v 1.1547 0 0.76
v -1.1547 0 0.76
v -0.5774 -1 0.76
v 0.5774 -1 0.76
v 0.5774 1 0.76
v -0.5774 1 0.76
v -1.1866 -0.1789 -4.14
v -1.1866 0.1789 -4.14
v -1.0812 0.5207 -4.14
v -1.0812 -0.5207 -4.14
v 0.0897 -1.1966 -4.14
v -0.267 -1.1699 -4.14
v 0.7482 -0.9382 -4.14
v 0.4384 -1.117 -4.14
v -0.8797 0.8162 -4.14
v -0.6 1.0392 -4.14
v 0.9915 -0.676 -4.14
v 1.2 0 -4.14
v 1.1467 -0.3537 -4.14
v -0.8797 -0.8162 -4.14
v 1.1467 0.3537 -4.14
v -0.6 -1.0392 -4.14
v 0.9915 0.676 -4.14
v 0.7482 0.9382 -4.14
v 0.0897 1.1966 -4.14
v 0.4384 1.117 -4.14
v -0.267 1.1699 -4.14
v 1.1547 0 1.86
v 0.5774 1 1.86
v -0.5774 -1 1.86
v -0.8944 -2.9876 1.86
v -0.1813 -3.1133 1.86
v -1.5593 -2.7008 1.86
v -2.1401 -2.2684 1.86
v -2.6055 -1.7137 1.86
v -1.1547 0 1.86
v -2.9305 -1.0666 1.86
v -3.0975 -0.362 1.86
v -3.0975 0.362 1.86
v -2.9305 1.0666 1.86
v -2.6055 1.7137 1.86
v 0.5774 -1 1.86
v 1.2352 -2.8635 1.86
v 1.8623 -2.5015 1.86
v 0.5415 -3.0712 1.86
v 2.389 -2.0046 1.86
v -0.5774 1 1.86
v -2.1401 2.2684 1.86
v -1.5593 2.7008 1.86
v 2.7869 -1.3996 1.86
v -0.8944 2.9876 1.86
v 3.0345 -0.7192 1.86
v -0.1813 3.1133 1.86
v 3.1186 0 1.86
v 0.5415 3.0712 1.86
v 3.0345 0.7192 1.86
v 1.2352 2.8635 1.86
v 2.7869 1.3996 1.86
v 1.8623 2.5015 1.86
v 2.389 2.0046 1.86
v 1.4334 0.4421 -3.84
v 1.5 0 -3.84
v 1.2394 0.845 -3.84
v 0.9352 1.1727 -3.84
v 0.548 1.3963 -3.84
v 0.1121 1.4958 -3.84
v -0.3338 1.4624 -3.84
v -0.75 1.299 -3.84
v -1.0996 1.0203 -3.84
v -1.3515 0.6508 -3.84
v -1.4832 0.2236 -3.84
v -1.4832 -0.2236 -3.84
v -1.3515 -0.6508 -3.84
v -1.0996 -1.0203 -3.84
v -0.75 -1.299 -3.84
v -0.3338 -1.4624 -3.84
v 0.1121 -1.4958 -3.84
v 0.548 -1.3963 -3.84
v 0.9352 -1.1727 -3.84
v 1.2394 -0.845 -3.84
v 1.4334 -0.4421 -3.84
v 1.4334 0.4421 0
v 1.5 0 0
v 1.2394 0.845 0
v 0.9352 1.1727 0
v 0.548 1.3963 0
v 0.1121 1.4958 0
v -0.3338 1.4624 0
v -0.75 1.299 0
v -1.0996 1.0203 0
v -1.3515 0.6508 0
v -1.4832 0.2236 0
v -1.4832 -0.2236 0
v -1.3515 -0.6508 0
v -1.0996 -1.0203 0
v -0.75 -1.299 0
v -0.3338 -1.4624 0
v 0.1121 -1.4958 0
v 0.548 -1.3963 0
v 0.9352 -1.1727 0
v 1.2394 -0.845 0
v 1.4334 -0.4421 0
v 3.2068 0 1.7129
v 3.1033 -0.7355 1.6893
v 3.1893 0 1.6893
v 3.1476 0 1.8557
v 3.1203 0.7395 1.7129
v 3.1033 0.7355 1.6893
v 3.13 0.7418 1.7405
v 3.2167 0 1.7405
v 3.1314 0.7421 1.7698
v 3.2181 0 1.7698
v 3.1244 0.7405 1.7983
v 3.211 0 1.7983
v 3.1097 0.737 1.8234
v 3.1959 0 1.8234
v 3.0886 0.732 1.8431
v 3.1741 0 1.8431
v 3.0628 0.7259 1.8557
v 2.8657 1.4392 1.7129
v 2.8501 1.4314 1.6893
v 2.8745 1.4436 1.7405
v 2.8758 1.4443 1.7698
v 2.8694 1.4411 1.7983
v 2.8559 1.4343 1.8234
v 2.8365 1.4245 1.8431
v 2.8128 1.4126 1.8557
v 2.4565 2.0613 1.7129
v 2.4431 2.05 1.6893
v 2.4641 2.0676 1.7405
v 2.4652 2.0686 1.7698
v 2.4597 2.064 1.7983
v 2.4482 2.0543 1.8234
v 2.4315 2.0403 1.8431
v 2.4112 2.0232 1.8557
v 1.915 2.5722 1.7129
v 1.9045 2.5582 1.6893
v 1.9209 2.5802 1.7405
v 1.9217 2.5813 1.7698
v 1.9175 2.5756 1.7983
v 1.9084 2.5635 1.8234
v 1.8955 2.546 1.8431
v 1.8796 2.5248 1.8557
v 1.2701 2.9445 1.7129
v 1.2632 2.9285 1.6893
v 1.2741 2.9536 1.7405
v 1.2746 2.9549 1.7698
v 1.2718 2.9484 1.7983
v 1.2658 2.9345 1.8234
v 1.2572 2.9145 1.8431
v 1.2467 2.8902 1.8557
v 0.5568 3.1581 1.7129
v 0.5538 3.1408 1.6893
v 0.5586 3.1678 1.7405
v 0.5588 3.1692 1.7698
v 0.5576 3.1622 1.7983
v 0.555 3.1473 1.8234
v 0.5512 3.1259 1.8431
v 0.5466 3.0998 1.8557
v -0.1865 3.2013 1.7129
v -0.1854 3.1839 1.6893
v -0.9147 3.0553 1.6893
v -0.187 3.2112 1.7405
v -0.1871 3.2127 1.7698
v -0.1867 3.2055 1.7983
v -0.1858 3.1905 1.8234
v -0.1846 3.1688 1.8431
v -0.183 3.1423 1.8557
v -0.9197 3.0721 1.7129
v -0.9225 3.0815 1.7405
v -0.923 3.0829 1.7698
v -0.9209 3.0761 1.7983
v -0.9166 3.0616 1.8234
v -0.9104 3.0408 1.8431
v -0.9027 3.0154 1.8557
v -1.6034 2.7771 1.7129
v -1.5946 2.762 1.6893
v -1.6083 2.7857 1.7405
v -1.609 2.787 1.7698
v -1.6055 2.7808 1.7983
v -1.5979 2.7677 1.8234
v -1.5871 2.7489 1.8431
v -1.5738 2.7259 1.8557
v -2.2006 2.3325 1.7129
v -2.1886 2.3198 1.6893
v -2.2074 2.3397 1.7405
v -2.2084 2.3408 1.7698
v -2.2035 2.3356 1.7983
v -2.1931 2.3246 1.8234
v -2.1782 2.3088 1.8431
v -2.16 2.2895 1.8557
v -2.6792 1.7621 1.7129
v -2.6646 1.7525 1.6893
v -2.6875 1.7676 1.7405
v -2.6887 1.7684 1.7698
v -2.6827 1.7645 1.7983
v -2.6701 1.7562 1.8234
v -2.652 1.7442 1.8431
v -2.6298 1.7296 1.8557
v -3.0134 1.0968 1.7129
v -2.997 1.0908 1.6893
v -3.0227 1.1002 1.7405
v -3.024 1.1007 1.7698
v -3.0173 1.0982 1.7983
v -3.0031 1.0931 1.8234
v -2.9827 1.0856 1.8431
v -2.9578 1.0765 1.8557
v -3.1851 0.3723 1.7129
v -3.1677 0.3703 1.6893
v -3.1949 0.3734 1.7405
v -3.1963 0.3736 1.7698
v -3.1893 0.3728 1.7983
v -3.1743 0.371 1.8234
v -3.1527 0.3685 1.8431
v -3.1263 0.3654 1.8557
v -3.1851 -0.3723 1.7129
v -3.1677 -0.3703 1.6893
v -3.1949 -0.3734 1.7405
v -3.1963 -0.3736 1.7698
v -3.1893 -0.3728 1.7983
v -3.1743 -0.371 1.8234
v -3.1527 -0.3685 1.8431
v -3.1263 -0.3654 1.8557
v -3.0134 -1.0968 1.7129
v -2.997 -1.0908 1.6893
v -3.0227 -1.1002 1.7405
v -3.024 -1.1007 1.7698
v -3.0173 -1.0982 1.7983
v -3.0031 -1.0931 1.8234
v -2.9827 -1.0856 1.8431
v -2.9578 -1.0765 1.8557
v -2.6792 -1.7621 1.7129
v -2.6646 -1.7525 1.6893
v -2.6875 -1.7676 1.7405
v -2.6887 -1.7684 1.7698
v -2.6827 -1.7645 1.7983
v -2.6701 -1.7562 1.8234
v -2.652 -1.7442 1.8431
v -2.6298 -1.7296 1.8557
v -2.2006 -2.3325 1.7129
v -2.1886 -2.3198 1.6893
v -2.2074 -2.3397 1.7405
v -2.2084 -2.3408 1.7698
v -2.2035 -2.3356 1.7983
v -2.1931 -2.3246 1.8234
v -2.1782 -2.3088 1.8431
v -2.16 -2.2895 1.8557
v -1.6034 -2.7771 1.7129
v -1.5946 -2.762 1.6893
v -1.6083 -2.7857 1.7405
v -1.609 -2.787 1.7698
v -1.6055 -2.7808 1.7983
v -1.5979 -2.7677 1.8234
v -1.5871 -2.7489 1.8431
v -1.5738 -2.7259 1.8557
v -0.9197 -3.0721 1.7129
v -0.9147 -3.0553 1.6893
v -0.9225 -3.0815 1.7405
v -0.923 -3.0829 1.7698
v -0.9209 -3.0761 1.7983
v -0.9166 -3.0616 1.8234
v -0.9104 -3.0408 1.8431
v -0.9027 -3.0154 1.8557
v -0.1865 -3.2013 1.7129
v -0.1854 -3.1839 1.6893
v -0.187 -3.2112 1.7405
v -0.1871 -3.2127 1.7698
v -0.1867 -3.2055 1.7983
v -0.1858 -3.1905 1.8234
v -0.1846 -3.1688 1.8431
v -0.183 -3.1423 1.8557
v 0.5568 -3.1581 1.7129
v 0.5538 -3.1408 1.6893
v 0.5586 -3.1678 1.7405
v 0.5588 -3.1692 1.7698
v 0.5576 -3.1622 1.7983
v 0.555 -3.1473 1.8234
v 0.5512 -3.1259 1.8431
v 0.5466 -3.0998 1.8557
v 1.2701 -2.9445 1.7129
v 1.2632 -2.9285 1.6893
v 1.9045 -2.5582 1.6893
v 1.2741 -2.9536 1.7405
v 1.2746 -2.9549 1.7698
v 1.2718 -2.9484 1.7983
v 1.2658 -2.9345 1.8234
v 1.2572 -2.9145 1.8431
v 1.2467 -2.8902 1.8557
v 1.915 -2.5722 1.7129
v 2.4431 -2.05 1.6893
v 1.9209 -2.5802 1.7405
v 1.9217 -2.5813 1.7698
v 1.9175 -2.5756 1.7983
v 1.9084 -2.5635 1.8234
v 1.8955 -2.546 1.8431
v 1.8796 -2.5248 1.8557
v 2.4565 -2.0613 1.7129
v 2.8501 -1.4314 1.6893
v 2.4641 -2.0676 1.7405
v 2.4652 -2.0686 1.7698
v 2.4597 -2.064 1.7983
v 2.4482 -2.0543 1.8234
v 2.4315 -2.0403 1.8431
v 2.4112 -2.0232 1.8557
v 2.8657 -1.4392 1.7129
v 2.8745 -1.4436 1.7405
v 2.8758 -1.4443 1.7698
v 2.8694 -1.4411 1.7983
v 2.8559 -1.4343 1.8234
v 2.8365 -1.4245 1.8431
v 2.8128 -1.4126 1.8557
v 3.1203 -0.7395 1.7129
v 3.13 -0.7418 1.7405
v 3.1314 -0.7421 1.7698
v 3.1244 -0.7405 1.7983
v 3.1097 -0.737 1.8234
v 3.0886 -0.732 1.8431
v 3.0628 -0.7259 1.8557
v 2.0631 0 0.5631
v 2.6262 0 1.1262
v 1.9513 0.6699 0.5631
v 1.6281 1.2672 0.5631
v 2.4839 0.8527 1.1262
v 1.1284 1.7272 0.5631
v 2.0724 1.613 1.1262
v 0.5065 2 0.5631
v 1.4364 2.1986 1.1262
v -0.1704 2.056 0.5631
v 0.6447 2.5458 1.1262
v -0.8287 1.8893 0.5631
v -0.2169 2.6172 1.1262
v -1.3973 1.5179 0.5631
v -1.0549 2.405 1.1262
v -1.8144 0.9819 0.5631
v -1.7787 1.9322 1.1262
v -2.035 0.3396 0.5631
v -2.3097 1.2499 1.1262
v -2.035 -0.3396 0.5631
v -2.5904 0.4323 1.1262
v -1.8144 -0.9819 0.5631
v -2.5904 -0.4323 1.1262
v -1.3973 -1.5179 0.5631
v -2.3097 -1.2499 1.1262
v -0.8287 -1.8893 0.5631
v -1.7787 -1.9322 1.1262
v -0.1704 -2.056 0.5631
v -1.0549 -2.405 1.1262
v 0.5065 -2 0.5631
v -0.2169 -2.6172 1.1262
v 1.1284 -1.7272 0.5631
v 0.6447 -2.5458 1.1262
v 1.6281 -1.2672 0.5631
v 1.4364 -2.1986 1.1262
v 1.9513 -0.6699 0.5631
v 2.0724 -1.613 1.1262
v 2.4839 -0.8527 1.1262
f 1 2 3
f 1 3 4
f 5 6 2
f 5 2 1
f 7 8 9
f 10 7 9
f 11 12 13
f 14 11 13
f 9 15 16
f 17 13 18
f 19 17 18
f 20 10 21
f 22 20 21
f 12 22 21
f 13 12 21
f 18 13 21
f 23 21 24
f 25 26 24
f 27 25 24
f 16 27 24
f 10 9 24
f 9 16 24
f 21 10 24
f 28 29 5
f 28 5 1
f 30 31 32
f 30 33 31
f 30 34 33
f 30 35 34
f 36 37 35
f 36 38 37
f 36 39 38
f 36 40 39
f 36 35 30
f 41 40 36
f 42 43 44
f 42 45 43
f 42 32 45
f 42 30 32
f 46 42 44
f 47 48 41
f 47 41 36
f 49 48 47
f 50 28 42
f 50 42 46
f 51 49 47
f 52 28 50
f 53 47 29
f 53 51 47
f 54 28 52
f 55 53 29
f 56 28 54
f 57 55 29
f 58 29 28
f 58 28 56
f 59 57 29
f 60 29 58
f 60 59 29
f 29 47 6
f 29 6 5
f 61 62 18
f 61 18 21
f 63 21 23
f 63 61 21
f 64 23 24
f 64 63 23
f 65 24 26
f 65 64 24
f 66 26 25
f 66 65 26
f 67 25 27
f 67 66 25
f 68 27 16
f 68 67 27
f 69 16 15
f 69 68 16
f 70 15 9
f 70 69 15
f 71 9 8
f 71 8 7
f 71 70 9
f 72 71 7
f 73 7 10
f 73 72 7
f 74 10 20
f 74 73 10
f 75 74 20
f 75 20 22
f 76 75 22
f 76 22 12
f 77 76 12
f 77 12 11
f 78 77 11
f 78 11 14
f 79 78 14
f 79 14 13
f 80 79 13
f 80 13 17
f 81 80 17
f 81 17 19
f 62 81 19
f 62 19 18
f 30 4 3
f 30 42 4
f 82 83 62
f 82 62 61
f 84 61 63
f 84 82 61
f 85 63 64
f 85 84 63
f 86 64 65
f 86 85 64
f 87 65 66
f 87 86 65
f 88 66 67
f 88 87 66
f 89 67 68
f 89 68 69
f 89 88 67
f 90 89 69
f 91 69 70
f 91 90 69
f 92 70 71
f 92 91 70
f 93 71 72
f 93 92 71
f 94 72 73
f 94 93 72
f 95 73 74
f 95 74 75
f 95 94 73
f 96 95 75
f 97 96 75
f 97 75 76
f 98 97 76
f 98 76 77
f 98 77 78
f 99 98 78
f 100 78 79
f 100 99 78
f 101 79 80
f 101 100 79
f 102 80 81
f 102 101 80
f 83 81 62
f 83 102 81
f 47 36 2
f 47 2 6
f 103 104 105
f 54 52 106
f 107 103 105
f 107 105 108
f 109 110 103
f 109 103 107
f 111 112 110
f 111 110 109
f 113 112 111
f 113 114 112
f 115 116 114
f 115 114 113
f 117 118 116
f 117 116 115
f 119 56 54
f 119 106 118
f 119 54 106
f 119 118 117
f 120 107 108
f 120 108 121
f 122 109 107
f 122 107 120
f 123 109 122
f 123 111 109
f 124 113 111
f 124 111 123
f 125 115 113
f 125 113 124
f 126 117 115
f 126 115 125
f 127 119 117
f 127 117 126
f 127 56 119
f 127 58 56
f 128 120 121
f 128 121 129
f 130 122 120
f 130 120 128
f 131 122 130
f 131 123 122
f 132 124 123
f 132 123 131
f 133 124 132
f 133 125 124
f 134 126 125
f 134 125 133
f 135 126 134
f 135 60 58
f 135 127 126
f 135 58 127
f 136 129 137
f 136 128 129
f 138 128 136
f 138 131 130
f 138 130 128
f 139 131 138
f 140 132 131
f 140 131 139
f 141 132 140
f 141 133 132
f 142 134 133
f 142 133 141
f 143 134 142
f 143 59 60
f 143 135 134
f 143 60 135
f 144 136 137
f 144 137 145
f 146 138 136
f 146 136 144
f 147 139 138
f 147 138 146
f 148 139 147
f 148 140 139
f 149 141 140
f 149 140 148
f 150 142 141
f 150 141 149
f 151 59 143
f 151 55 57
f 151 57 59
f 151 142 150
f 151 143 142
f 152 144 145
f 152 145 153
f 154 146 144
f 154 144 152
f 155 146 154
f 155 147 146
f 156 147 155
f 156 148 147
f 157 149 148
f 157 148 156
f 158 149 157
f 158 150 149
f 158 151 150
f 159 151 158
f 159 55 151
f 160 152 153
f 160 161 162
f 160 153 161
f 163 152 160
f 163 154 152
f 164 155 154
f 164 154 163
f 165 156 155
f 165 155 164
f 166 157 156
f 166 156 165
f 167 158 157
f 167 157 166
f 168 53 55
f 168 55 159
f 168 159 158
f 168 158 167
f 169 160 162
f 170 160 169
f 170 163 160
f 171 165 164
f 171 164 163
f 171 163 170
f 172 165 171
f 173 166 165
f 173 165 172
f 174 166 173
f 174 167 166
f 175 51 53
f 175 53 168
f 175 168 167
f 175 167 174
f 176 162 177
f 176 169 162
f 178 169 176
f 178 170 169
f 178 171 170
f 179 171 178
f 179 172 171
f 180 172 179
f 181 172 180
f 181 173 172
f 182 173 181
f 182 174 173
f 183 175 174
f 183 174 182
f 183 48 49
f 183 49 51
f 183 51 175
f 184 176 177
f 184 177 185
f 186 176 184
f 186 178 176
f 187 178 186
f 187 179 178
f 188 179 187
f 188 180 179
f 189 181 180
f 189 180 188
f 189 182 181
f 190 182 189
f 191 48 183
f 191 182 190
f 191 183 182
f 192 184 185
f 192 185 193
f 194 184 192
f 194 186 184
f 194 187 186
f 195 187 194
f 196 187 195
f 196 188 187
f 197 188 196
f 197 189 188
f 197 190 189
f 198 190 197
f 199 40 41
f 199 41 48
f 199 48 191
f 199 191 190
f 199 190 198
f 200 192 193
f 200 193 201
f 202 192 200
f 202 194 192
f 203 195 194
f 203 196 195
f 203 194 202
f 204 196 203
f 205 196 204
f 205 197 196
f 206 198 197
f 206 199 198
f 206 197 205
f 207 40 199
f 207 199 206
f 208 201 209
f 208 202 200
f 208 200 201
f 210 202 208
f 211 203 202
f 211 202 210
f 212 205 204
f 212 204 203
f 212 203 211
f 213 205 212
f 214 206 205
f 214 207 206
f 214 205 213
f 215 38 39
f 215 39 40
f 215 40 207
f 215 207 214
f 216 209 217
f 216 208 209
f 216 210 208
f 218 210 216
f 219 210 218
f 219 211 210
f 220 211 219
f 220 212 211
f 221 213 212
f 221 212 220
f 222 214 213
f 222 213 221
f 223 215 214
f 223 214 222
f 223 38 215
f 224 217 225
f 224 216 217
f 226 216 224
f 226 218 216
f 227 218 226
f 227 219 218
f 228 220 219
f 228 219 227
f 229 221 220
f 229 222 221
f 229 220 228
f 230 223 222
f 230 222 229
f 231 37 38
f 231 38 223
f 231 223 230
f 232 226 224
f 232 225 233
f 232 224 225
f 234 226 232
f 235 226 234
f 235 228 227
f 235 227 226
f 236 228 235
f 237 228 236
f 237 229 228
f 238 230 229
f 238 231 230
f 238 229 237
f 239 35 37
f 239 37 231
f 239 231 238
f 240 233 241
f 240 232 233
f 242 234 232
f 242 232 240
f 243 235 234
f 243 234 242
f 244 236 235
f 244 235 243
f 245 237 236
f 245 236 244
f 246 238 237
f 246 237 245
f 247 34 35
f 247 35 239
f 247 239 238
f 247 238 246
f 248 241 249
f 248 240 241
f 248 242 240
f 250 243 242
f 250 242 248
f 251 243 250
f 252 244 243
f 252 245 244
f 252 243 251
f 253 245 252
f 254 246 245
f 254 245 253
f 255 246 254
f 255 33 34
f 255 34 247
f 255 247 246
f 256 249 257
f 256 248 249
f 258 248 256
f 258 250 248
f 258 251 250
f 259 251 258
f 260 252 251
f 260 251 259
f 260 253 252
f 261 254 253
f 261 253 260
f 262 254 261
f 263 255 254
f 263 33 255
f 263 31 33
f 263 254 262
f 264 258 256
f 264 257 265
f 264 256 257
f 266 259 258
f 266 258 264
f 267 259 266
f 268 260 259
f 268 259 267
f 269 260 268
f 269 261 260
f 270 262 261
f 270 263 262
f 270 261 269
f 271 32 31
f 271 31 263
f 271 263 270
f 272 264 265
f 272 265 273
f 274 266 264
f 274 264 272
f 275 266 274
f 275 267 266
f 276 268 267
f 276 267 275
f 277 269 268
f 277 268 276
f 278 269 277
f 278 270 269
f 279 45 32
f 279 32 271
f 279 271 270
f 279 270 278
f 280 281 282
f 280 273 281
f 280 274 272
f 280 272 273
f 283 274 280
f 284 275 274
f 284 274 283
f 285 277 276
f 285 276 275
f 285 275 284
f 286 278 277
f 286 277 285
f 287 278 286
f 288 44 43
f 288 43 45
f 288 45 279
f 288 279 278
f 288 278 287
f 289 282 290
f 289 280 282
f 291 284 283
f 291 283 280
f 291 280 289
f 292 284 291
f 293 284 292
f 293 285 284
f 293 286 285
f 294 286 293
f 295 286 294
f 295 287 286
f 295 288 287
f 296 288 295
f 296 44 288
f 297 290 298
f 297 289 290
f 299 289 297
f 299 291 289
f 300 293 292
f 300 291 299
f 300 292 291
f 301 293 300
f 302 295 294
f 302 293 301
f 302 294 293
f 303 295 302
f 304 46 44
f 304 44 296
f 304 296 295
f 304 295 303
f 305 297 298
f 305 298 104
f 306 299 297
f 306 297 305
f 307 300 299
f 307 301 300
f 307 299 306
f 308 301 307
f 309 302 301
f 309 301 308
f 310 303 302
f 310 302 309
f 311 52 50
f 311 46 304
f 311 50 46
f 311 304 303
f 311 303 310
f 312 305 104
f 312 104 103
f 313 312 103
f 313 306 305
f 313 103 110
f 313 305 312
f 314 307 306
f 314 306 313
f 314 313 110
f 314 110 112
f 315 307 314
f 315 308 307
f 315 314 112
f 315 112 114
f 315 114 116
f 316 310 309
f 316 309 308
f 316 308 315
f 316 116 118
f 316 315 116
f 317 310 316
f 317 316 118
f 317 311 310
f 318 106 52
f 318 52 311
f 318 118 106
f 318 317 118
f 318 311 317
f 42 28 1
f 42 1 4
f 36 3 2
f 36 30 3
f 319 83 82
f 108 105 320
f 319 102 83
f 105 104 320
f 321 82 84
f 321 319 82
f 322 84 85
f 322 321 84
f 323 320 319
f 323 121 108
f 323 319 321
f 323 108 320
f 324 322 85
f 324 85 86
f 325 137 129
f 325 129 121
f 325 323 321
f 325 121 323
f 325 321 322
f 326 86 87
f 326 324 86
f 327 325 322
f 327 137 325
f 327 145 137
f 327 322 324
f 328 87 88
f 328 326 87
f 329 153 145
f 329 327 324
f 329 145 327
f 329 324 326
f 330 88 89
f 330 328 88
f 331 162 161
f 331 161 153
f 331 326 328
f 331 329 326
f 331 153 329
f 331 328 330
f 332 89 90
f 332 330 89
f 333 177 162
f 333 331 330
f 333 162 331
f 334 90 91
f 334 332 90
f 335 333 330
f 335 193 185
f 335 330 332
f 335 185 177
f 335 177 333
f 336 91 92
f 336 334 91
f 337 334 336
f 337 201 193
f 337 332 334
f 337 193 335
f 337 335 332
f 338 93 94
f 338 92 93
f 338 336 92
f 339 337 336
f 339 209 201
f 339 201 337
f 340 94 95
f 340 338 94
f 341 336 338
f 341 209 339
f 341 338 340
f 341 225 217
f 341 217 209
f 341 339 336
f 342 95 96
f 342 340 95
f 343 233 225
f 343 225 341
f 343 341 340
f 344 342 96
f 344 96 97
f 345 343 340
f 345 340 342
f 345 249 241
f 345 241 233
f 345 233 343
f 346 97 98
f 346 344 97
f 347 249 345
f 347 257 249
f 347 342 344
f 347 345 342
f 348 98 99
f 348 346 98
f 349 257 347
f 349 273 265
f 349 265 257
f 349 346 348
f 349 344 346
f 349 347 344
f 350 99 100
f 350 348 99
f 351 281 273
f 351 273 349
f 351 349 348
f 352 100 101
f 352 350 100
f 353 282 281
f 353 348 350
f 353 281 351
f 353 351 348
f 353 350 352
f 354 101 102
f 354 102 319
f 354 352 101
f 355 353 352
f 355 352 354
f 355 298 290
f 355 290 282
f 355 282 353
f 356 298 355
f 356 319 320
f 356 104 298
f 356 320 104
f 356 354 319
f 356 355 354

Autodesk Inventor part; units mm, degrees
ref_plane "YZ Plane" through (0, 0, 0) normal (1, 0, 0) x (0, 1, 0)
ref_plane "XZ Plane" through (0, 0, 0) normal (0, 1, 0) x (-1, 0, 0)
ref_plane "XY Plane" through (0, 0, 0) normal (0, 0, 1) x (1, 0, 0)
sketch "Sketch2" plane through (0, 0, 0) normal (0, 0, 1) x (1, 0, 0)
  circle A0 centre (0, 0) radius 1.5
  dimension "Diameter" = 3
extrude "Extrusion1" add sketch "Sketch2" against normal blind 4.14
sketch "Sketch3" plane through (0, 0, 0) normal (0, 0, 1) x (1, 0, 0)
  circle A0 centre (0, 0) radius 1.5 projected
extrude "Extrusion2" add sketch "Sketch3" along normal blind 1.86 draft 45
sketch "Sketch4" plane through (0, 0, 1.86) normal (0, 0, 1) x (1, 0, 0)
  circle A0 centre (0, 0) radius 3.36 projected
  line L0 (0.5774, 1) -> (1.1547, 0)
  line L1 (1.1547, 0) -> (0.5774, -1)
  line L2 (0.5774, -1) -> (-0.5774, -1)
  line L3 (-0.5774, -1) -> (-1.1547, 0)
  line L4 (-1.1547, 0) -> (-0.5774, 1)
  line L5 (-0.5774, 1) -> (0.5774, 1)
  line L6 (0, 0) -> (1.1547, 0) construction
  dimension "Hex_Width" = 2
extrude "Extrusion3" cut sketch "Sketch4" against normal blind 1.1 contours L0 L1 L2 L3 L4 L5
thread "Thread1" size "M3x0.5" class "6g" standard "ANSI Metric M Profile-Short lst" length 4.14
chamfer "Chamfer1" distance 0.3 angle 45 1 edges at (-1.5, 0, -4.14)
fillet "Fillet1" radius 0.1 1 edges at (-3.36, 0, 1.86)
equation "\"Length1\" = Length - Head_Height"
equation "\"Thread_Length\" = Length1"
equation "\"Length\" = 6"
equation "\"Head_Height\" = 1.86"
properties part number "SCREW,FLAT-HD,SS,18-8,M03X0_50X006MM" material "Steel, 1018, CRS"
